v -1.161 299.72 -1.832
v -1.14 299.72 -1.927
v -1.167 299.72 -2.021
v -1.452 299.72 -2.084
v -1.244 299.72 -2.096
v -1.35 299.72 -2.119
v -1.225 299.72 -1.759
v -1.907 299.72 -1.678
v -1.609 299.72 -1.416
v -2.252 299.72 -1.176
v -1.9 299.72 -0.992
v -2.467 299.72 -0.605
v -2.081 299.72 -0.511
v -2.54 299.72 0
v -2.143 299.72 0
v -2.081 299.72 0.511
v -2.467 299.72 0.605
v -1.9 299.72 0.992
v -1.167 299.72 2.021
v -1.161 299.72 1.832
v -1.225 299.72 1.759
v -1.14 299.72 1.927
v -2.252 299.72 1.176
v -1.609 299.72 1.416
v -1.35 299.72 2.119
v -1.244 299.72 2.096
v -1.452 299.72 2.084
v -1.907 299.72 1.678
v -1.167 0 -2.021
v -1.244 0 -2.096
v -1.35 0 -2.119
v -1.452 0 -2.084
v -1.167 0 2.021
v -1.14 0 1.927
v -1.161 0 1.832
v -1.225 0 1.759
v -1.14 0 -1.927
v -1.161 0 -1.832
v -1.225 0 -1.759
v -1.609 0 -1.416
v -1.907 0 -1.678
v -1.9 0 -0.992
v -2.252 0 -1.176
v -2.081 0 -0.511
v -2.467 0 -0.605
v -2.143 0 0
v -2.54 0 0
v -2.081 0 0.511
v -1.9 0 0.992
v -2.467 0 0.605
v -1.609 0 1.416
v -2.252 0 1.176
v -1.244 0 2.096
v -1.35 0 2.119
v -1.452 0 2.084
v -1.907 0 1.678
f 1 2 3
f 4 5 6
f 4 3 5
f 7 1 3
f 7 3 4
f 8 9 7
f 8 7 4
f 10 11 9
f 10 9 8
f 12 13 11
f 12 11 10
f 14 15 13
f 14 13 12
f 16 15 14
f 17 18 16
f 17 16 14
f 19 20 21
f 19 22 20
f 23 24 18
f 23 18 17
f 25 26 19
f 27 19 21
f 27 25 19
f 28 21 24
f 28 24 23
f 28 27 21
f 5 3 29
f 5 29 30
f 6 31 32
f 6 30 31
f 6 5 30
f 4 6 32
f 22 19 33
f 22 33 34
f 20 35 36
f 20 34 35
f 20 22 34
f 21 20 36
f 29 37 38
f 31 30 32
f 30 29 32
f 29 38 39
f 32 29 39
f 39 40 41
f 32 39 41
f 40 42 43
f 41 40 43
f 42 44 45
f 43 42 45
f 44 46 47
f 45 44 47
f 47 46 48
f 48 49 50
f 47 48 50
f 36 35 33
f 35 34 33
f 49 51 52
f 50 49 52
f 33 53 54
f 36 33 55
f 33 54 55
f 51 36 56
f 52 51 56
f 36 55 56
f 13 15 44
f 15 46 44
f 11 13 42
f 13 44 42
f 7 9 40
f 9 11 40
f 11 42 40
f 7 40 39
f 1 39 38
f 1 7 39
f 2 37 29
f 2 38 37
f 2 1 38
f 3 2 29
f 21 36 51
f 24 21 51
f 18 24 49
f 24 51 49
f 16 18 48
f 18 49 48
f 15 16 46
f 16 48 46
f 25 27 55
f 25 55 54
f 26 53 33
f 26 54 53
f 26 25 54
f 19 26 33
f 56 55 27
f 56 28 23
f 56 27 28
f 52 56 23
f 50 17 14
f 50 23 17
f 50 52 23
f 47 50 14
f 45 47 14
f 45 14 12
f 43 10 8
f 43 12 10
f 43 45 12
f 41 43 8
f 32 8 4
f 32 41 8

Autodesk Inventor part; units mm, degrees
ref_plane "YZ Plane" through (0, 0, 0) normal (1, 0, 0) x (0, 1, 0)
ref_plane "XZ Plane" through (0, 0, 0) normal (0, 1, 0) x (-1, 0, 0)
ref_plane "XY Plane" through (0, 0, 0) normal (0, 0, 1) x (1, 0, 0)
sketch "Sketch1" plane through (0, 0, 0) normal (0, 1, 0) x (-1, 0, 0)
  circle A0 centre (0, 0) radius 2.54
  line L0 (0, 0) -> (0, 2.54)
  line L1 (0, 0) -> (1.27, 2.1997)
  line L2 (0, 0) -> (2.54, 0) construction
  line L3 (0, 0) -> (1.27, -2.1997)
  line L4 (0, 0) -> (2.54, 0) construction
  circle A1 centre (0, 0) radius 2.1431
  point P0 (1.0716, 1.856)
  point P1 (1.0716, -1.856)
  dimension "d0" = 5.08
  dimension "d1" = 60
  dimension "d2" = 60
  dimension "d3" = 0.3969
extrude "Extrusion1" add sketch "Sketch1" along normal blind 299.72 contours A0 L3 A1 L1
fillet "Fillet1" radius 0.1984 4 edges at (-1.0716, 149.86, 1.856) (-1.27, 149.86, 2.1997) (-1.0716, 149.86, -1.856) (-1.27, 149.86, -2.1997)
properties part number "11.8inch bands" material "Rubber, Silicone"
